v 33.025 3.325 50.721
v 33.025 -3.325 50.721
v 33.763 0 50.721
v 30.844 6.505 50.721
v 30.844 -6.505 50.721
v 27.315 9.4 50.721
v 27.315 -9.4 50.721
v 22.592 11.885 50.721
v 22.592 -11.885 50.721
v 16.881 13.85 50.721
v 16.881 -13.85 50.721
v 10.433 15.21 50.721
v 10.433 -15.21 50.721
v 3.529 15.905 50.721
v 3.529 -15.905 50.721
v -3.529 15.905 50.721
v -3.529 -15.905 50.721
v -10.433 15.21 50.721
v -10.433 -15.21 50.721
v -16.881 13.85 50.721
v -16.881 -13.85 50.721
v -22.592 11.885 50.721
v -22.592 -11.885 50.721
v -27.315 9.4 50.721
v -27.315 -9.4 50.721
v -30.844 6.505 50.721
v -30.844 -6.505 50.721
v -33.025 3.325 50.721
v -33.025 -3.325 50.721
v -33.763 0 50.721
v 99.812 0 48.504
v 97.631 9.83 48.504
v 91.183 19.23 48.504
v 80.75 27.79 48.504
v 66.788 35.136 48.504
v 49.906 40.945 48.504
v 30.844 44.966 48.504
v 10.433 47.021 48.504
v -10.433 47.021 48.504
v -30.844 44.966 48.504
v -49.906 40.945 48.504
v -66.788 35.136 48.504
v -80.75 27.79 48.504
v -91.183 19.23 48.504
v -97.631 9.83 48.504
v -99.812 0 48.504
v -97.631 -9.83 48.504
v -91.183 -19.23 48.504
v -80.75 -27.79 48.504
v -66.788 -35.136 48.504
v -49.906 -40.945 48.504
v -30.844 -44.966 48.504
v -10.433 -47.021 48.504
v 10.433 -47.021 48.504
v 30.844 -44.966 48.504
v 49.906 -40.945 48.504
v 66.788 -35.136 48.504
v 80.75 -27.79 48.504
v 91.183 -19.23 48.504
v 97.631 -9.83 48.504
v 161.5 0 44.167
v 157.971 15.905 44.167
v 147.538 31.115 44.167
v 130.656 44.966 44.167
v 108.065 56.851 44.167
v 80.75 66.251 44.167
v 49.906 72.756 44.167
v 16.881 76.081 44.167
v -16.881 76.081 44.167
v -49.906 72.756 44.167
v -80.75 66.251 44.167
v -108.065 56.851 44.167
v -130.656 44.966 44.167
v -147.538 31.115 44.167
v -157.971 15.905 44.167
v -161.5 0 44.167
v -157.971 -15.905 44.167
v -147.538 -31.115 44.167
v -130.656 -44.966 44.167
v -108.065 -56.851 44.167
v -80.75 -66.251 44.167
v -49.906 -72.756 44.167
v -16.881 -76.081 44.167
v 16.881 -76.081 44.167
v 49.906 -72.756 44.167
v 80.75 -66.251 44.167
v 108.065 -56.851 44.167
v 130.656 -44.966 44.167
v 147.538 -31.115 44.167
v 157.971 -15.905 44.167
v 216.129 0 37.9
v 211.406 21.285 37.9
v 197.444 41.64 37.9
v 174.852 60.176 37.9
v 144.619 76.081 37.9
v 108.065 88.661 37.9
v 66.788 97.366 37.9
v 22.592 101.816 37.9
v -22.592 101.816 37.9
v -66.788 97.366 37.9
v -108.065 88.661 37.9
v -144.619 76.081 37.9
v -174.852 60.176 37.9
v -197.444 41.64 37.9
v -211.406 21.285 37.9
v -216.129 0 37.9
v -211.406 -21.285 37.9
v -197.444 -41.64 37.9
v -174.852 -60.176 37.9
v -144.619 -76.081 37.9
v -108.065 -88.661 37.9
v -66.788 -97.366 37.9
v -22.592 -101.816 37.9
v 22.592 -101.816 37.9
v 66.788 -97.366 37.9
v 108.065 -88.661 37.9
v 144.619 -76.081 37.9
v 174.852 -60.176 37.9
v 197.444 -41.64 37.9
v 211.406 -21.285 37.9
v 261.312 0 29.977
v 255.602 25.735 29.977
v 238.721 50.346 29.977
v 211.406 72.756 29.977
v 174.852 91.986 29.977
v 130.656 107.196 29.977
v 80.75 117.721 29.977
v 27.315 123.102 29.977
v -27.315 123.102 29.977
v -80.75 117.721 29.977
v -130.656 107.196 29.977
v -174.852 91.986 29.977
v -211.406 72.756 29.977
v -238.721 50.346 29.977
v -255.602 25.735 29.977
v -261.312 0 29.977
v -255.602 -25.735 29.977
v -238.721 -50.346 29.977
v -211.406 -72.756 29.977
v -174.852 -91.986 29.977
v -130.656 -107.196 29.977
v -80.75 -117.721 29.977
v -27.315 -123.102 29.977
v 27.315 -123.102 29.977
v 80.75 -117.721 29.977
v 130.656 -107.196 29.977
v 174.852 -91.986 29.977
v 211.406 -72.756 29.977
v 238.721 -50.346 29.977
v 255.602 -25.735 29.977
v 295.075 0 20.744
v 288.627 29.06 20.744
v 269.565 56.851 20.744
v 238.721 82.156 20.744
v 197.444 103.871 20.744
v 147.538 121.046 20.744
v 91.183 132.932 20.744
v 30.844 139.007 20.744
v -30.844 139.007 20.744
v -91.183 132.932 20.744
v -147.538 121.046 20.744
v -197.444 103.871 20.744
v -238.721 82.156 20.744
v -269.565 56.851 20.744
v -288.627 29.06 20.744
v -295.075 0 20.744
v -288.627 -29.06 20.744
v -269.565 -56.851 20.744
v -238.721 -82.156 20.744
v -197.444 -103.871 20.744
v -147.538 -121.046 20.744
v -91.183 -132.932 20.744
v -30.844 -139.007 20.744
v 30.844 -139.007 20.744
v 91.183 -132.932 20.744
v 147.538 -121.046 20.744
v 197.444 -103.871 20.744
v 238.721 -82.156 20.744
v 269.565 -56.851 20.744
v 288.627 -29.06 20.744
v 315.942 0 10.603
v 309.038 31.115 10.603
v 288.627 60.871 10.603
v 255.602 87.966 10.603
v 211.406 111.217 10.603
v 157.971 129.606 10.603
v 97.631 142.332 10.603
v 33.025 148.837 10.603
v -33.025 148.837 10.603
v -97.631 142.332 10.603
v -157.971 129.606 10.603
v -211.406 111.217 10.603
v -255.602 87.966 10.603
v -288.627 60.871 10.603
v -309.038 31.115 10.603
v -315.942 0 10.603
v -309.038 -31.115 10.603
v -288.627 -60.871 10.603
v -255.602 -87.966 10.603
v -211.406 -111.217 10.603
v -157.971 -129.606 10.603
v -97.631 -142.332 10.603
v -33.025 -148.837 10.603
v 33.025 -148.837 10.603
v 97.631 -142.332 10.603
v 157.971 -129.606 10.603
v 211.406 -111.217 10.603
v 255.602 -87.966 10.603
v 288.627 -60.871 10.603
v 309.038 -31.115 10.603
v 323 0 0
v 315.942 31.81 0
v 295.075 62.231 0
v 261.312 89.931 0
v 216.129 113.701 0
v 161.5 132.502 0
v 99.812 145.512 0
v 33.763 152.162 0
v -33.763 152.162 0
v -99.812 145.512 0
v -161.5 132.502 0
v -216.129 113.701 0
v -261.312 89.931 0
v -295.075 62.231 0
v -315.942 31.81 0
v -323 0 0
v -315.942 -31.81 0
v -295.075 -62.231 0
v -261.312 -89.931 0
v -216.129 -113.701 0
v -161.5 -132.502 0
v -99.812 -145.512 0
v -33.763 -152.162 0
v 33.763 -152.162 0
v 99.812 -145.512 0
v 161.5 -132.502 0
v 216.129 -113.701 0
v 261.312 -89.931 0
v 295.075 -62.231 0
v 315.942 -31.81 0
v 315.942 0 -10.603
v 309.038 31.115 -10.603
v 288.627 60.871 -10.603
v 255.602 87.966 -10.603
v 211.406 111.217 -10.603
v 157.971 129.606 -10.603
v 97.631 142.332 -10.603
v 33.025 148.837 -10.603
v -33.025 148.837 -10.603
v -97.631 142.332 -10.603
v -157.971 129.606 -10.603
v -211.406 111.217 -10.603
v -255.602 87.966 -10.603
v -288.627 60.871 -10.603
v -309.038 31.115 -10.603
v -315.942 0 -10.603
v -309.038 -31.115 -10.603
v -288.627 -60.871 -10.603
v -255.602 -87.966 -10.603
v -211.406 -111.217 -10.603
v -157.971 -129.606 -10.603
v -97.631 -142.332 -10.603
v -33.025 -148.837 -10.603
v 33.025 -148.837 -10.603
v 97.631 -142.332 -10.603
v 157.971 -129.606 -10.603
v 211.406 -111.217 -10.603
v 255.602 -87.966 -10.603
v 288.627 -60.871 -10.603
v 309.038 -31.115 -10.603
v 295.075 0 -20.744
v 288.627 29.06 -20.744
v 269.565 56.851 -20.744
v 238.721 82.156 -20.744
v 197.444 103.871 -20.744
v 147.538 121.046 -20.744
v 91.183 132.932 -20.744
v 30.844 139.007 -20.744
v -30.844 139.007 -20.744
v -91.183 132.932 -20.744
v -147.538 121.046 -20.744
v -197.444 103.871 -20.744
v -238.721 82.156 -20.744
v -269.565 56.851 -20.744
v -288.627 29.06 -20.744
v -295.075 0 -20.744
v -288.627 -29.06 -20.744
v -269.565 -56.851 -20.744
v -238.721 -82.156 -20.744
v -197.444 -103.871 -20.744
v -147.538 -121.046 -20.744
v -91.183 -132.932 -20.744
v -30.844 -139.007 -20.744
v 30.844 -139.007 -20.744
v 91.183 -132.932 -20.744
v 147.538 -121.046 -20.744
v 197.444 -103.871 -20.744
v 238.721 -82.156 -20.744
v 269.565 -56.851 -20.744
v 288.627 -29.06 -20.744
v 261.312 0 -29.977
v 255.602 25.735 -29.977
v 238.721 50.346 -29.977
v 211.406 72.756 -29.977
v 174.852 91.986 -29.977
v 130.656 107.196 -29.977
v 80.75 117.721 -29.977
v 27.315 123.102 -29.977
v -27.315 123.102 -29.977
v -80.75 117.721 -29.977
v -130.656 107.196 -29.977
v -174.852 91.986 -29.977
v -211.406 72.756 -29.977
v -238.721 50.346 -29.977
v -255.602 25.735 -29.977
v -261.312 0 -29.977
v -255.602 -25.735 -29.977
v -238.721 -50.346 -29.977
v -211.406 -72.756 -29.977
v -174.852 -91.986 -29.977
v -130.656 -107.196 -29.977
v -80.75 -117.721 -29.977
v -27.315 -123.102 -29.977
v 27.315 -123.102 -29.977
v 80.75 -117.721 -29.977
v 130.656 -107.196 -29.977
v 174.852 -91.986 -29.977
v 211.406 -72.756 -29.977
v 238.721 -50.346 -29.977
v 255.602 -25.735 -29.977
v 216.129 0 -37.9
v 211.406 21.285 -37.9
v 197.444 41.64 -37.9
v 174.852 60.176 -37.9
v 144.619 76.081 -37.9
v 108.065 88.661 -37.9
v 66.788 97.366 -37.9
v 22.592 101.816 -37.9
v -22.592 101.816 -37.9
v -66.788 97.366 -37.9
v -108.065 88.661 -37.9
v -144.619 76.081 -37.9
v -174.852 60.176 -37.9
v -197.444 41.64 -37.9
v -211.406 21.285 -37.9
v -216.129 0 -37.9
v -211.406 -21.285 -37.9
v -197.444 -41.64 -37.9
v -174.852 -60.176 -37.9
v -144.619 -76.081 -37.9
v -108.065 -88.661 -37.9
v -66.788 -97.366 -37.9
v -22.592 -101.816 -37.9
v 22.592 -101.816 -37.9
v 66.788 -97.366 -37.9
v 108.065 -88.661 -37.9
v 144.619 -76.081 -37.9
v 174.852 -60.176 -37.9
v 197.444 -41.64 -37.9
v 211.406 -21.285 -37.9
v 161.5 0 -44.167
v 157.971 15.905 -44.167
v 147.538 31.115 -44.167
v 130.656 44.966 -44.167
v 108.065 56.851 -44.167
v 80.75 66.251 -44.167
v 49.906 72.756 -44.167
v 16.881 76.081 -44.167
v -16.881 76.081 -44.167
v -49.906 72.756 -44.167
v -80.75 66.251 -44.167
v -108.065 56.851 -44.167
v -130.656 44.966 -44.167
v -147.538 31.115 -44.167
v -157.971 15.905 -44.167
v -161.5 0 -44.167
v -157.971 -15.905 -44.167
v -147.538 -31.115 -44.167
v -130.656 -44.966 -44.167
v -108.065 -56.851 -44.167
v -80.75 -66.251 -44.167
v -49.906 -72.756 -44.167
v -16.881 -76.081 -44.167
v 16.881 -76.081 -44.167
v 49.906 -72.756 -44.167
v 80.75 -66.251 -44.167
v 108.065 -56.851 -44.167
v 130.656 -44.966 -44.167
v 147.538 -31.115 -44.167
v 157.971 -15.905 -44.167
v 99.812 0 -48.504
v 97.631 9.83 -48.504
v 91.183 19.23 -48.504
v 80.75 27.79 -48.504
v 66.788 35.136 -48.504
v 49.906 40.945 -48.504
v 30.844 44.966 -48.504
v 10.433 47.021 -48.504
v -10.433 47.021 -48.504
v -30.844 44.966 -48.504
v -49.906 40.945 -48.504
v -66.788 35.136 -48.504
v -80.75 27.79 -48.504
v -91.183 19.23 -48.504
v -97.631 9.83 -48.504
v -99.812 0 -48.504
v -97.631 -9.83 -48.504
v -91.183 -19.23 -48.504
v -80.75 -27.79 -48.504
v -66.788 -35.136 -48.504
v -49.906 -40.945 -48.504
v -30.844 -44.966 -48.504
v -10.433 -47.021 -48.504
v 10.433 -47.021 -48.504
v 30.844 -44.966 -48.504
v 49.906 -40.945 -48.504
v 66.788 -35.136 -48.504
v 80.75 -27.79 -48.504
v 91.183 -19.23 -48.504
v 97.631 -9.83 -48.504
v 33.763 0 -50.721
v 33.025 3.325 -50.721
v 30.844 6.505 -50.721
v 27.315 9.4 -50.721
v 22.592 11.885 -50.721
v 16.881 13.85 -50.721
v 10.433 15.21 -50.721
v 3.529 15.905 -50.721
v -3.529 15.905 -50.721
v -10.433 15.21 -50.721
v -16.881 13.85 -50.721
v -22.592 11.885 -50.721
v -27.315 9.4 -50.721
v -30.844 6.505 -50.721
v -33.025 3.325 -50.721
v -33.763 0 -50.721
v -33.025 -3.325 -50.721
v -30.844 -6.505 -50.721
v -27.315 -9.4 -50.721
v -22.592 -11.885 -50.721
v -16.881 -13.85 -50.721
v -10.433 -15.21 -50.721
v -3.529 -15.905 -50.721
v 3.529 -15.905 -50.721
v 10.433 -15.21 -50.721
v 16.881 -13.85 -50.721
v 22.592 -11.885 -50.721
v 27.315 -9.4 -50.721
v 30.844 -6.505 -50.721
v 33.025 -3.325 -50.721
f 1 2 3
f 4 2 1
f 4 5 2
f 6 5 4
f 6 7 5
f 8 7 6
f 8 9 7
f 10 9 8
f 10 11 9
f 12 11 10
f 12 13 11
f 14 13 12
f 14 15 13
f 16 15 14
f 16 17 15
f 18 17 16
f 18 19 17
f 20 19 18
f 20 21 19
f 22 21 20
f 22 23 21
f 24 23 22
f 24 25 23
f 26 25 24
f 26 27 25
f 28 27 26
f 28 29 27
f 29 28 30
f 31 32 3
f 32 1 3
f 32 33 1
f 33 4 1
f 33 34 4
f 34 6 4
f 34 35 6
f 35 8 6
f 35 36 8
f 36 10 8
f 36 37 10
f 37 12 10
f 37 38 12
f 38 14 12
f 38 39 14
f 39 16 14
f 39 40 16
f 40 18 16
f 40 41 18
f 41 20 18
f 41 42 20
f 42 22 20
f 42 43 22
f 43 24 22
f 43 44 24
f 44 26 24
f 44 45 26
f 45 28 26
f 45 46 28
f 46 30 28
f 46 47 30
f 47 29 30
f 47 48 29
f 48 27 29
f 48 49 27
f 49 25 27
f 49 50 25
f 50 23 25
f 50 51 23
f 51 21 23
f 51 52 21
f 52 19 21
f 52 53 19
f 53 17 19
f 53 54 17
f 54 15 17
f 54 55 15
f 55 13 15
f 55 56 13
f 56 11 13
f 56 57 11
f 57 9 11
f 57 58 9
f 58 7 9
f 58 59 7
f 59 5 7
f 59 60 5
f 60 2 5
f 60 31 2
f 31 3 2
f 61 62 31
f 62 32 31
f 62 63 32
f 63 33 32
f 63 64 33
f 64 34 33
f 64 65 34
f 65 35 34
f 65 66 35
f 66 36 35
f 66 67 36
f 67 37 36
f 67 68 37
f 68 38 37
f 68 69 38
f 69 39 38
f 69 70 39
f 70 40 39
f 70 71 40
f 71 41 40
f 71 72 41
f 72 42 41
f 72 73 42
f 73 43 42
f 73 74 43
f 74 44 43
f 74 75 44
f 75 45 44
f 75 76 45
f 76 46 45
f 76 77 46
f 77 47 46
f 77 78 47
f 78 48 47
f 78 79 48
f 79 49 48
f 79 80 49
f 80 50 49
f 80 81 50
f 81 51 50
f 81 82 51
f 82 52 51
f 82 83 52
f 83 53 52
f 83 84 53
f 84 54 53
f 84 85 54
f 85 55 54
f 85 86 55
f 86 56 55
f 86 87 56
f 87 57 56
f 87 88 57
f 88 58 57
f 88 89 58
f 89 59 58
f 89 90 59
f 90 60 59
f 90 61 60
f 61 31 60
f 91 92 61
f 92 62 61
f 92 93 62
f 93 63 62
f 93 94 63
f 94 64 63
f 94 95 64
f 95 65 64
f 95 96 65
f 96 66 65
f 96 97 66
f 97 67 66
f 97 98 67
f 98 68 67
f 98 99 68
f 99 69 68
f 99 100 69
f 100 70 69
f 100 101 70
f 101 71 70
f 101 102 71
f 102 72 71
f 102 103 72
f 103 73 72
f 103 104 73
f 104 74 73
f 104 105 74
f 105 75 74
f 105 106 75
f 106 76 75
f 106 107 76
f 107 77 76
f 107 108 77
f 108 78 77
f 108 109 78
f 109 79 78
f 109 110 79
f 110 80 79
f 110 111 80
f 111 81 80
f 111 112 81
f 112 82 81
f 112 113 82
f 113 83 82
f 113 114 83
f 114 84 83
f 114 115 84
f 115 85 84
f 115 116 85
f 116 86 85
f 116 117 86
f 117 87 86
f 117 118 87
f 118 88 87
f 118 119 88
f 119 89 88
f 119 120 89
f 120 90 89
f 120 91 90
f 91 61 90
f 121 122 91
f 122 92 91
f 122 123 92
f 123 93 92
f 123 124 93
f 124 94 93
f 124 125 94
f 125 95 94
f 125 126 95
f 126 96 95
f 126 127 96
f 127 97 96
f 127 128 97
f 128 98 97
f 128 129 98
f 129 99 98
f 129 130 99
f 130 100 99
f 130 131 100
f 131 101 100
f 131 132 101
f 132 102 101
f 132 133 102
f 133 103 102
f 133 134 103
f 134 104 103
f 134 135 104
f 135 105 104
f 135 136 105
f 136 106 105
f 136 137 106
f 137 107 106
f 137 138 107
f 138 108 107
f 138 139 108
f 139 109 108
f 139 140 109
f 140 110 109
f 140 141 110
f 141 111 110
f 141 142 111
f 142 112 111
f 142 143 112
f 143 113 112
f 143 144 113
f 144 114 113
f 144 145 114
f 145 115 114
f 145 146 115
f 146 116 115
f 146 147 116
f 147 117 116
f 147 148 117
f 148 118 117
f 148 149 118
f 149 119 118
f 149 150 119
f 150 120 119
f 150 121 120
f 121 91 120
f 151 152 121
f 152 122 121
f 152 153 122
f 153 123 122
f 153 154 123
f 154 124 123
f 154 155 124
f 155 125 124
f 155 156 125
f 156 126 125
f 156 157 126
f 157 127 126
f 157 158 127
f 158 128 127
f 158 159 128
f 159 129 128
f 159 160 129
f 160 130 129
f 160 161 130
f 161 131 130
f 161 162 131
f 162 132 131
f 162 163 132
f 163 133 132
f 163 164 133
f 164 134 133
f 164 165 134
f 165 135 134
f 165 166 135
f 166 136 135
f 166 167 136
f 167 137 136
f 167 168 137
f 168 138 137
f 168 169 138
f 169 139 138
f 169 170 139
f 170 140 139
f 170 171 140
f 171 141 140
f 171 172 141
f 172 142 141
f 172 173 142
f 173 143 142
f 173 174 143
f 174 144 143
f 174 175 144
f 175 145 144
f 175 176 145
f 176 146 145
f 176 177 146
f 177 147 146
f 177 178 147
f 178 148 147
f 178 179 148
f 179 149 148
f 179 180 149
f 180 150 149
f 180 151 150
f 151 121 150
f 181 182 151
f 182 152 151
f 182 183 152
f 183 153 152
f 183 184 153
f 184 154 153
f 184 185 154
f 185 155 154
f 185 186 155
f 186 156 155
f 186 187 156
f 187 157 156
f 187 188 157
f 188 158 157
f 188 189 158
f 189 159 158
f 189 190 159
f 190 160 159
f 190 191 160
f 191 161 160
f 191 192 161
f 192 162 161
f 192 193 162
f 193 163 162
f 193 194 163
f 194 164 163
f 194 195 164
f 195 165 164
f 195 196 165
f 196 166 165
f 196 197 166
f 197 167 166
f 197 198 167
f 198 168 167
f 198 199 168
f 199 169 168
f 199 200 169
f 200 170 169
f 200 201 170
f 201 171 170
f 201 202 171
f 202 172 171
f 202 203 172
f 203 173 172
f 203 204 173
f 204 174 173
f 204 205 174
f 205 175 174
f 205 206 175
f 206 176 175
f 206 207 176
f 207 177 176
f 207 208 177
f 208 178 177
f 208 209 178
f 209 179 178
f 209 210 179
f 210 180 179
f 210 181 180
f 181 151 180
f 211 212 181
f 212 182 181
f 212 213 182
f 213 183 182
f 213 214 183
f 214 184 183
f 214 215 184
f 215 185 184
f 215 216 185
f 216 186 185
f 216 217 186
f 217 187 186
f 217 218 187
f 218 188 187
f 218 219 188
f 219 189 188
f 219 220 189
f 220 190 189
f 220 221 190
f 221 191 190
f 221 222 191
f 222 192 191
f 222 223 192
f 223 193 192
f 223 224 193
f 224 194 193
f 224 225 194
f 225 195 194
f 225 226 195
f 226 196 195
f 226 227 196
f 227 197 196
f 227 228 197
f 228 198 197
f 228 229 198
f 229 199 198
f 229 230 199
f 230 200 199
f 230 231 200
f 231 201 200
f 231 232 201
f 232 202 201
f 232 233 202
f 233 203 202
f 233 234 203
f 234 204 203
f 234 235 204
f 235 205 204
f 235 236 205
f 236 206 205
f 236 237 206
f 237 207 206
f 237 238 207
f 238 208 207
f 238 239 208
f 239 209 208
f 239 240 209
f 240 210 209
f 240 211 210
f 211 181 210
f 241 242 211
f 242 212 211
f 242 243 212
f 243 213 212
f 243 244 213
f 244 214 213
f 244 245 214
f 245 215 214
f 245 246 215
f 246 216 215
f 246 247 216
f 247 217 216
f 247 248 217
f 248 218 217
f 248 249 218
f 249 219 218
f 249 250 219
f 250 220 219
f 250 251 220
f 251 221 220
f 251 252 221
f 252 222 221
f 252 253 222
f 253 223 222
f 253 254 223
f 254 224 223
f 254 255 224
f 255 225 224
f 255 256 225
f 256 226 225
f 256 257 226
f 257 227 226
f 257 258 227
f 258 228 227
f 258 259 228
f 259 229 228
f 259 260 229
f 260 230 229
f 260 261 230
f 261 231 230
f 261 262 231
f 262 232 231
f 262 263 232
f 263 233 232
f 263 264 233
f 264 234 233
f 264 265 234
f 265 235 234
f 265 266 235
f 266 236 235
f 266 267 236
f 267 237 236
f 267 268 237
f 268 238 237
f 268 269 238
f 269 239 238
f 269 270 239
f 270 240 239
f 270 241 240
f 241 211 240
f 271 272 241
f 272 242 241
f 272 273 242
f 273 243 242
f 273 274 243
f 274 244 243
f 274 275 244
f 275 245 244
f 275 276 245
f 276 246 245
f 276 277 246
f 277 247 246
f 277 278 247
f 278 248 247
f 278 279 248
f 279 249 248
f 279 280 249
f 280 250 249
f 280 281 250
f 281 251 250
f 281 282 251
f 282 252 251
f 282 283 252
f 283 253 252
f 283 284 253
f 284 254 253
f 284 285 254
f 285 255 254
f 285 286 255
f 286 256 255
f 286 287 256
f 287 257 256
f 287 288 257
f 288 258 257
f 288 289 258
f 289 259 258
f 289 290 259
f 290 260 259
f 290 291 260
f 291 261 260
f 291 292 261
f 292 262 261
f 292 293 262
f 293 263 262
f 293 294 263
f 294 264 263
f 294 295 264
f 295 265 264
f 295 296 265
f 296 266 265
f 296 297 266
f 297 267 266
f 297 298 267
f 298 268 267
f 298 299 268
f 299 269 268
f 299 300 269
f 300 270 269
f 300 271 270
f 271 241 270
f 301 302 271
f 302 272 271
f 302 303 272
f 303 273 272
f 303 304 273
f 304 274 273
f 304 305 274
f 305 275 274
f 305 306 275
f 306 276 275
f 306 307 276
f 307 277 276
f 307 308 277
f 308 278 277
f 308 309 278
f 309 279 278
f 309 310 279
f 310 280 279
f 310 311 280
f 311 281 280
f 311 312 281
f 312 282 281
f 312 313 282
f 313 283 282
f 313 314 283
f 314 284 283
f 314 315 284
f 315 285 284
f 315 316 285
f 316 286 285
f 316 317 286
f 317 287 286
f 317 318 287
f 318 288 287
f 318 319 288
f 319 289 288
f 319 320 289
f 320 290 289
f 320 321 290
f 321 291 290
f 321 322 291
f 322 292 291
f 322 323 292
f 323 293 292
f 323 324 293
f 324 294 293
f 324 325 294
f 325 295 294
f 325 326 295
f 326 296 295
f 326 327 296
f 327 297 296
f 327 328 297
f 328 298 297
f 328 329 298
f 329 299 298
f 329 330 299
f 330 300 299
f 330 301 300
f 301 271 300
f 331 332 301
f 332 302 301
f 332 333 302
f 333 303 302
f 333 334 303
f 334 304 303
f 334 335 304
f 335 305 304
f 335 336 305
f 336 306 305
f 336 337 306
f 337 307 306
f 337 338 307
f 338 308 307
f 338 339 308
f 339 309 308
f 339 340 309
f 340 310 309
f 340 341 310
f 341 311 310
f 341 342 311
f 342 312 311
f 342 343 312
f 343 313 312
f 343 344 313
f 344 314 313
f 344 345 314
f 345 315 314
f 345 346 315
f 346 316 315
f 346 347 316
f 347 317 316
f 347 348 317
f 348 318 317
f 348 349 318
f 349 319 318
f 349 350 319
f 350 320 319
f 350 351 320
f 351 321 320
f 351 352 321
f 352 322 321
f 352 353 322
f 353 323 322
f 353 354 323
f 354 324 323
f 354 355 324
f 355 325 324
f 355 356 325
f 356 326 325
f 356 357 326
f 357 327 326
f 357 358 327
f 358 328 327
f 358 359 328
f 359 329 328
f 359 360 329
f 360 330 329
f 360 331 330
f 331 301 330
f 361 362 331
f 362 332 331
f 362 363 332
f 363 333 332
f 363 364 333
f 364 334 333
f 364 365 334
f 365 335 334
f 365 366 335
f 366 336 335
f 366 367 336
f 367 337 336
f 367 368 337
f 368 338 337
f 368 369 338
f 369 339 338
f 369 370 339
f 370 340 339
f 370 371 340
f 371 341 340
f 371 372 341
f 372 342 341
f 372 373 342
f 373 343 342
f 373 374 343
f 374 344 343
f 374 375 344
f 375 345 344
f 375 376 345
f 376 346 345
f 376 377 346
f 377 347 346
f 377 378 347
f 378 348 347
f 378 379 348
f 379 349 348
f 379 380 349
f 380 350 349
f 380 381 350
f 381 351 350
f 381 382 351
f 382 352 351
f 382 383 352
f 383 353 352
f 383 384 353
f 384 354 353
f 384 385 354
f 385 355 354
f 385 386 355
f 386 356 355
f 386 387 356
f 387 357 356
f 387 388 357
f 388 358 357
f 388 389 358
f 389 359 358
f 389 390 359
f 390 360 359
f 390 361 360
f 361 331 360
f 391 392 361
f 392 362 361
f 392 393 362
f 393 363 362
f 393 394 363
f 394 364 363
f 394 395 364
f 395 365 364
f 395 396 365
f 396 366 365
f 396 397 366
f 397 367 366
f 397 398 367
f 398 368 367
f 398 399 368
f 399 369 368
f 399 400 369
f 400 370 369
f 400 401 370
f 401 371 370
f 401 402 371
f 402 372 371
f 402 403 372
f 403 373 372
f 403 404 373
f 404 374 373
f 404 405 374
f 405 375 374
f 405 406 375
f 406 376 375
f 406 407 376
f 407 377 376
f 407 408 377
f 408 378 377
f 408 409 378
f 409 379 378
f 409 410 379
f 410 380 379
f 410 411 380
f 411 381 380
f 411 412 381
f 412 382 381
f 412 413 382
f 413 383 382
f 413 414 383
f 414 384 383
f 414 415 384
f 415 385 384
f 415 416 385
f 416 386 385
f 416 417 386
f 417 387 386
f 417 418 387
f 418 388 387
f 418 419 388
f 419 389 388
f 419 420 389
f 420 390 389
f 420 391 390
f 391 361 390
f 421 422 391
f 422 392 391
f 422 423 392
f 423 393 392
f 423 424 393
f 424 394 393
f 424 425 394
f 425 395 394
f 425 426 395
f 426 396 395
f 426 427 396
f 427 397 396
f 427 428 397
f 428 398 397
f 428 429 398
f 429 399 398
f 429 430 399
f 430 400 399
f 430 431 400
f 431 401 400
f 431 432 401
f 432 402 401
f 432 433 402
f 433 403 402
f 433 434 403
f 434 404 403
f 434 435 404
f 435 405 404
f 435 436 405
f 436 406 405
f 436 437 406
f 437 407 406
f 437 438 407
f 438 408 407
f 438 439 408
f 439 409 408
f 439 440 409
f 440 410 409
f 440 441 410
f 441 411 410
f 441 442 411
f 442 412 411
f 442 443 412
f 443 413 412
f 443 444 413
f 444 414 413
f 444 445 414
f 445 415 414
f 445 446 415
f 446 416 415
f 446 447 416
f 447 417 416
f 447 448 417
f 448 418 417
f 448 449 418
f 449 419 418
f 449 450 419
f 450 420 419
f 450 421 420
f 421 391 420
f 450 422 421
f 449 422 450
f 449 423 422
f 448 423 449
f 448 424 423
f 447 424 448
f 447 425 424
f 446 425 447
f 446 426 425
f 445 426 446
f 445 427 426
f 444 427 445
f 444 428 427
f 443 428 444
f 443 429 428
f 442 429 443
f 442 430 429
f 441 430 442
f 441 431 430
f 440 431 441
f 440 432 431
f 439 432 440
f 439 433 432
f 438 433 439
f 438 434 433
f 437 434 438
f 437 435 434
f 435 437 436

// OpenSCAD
// Generated by SolidPython 1.0.1 on 2020-07-29 00:46:53


scale(v = [19, 9, 3]) {
	sphere(r = 17);
}
/***********************************************
*********      SolidPython code:      **********
************************************************
 
# import packages: SolidPython
from solid import *
from solid.utils import *
from itertools import chain, combinations, permutations


class Resize:

    def __init__(self, scad_file):
        self.scad_file = scad_file
        #self.scad_file = import_scad(scad_file)
        # cone/cylinder param:
        self.r1 = 0
        self.r2 = 0
        self.h = 0
        # rectangular prism param:
        self.w = 0
        self.l = 0
        # ellipse param:
        self.r = 0

    # import OpenScad code (file name corresponds to shape)


    # classify shape + parameters
    def assign(self, param1, param2, param3):
        if self.scad_file == 'cone.scad':
            self.r1 = param1
            self.r2 = param2
            self.h = param3
        elif self.scad_file == 'cylinder.scad':
            self.r1 = param1
            self.r2 = param2
            self.h = param3
        elif self.scad_file == 'rectangularPrism.scad':
            self.h = param1
            self.l = param2
            self.w = param3
        else:
            self.r = param1
            self.h = param2

    # resize parameters
    def iterate(self):
        x = range(3, 20, 2)
        i = 1
        if self.scad_file == 'cone.scad':
            tempList = list(permutations(x, 2))
            for temp in tempList:
                param1 = temp[0]
                param2 = temp[1]
                filepath = 'produced_scad_files/' + 'cone' + str(param1) + '_' + str(param2) + '_' + '.scad'
                scad_render_to_file(cylinder(h=param1, r1=param2, r2=0), filepath)

        elif self.scad_file == 'cylinder.scad':
            tempList = list(permutations(x, 3))
            for temp in tempList:
                param1 = temp[0]
                param2 = temp[1]
                filepath = 'produced_scad_files/' + 'cylinder' + str(param1) + '_' + str(param2) + '_' + '.scad'
                scad_render_to_file(cylinder(h=param1, r1=param2, r2=param2), filepath)

        elif self.scad_file == 'rectangularPrism.scad':
            tempList = list(permutations(x, 3))
            for temp in tempList:
                param1 = temp[0]
                param2 = temp[1]
                param3 = temp[2]
                filepath = 'produced_scad_files/' + 'rectangularPrism' + str(param1) + '_' + str(param2) + '_' + str(
                    param3) + '.scad'
                scad_render_to_file(cube(size=(param1, param2, param3)), filepath)

        elif self.scad_file == 'ellipse.scad':
            tempList = list(permutations(x, 4))
            for temp in tempList:
                param1 = temp[0]
                param2 = temp[1]
                param3 = temp[2]
                param4 = temp[3]
                filepath = 'produced_scad_files/' + 'ellipse' + str(param1) + '_' + str(param2) + '_' + str(param3) + '_' + str(param4) + '.scad'
                scad_render_to_file(scale([param1, param2, param3])(sphere(r=param4)), filepath)

    def render_to_scadfile(self):
        scad_render_to_file(scad, 'example.scad') 
 
************************************************/
